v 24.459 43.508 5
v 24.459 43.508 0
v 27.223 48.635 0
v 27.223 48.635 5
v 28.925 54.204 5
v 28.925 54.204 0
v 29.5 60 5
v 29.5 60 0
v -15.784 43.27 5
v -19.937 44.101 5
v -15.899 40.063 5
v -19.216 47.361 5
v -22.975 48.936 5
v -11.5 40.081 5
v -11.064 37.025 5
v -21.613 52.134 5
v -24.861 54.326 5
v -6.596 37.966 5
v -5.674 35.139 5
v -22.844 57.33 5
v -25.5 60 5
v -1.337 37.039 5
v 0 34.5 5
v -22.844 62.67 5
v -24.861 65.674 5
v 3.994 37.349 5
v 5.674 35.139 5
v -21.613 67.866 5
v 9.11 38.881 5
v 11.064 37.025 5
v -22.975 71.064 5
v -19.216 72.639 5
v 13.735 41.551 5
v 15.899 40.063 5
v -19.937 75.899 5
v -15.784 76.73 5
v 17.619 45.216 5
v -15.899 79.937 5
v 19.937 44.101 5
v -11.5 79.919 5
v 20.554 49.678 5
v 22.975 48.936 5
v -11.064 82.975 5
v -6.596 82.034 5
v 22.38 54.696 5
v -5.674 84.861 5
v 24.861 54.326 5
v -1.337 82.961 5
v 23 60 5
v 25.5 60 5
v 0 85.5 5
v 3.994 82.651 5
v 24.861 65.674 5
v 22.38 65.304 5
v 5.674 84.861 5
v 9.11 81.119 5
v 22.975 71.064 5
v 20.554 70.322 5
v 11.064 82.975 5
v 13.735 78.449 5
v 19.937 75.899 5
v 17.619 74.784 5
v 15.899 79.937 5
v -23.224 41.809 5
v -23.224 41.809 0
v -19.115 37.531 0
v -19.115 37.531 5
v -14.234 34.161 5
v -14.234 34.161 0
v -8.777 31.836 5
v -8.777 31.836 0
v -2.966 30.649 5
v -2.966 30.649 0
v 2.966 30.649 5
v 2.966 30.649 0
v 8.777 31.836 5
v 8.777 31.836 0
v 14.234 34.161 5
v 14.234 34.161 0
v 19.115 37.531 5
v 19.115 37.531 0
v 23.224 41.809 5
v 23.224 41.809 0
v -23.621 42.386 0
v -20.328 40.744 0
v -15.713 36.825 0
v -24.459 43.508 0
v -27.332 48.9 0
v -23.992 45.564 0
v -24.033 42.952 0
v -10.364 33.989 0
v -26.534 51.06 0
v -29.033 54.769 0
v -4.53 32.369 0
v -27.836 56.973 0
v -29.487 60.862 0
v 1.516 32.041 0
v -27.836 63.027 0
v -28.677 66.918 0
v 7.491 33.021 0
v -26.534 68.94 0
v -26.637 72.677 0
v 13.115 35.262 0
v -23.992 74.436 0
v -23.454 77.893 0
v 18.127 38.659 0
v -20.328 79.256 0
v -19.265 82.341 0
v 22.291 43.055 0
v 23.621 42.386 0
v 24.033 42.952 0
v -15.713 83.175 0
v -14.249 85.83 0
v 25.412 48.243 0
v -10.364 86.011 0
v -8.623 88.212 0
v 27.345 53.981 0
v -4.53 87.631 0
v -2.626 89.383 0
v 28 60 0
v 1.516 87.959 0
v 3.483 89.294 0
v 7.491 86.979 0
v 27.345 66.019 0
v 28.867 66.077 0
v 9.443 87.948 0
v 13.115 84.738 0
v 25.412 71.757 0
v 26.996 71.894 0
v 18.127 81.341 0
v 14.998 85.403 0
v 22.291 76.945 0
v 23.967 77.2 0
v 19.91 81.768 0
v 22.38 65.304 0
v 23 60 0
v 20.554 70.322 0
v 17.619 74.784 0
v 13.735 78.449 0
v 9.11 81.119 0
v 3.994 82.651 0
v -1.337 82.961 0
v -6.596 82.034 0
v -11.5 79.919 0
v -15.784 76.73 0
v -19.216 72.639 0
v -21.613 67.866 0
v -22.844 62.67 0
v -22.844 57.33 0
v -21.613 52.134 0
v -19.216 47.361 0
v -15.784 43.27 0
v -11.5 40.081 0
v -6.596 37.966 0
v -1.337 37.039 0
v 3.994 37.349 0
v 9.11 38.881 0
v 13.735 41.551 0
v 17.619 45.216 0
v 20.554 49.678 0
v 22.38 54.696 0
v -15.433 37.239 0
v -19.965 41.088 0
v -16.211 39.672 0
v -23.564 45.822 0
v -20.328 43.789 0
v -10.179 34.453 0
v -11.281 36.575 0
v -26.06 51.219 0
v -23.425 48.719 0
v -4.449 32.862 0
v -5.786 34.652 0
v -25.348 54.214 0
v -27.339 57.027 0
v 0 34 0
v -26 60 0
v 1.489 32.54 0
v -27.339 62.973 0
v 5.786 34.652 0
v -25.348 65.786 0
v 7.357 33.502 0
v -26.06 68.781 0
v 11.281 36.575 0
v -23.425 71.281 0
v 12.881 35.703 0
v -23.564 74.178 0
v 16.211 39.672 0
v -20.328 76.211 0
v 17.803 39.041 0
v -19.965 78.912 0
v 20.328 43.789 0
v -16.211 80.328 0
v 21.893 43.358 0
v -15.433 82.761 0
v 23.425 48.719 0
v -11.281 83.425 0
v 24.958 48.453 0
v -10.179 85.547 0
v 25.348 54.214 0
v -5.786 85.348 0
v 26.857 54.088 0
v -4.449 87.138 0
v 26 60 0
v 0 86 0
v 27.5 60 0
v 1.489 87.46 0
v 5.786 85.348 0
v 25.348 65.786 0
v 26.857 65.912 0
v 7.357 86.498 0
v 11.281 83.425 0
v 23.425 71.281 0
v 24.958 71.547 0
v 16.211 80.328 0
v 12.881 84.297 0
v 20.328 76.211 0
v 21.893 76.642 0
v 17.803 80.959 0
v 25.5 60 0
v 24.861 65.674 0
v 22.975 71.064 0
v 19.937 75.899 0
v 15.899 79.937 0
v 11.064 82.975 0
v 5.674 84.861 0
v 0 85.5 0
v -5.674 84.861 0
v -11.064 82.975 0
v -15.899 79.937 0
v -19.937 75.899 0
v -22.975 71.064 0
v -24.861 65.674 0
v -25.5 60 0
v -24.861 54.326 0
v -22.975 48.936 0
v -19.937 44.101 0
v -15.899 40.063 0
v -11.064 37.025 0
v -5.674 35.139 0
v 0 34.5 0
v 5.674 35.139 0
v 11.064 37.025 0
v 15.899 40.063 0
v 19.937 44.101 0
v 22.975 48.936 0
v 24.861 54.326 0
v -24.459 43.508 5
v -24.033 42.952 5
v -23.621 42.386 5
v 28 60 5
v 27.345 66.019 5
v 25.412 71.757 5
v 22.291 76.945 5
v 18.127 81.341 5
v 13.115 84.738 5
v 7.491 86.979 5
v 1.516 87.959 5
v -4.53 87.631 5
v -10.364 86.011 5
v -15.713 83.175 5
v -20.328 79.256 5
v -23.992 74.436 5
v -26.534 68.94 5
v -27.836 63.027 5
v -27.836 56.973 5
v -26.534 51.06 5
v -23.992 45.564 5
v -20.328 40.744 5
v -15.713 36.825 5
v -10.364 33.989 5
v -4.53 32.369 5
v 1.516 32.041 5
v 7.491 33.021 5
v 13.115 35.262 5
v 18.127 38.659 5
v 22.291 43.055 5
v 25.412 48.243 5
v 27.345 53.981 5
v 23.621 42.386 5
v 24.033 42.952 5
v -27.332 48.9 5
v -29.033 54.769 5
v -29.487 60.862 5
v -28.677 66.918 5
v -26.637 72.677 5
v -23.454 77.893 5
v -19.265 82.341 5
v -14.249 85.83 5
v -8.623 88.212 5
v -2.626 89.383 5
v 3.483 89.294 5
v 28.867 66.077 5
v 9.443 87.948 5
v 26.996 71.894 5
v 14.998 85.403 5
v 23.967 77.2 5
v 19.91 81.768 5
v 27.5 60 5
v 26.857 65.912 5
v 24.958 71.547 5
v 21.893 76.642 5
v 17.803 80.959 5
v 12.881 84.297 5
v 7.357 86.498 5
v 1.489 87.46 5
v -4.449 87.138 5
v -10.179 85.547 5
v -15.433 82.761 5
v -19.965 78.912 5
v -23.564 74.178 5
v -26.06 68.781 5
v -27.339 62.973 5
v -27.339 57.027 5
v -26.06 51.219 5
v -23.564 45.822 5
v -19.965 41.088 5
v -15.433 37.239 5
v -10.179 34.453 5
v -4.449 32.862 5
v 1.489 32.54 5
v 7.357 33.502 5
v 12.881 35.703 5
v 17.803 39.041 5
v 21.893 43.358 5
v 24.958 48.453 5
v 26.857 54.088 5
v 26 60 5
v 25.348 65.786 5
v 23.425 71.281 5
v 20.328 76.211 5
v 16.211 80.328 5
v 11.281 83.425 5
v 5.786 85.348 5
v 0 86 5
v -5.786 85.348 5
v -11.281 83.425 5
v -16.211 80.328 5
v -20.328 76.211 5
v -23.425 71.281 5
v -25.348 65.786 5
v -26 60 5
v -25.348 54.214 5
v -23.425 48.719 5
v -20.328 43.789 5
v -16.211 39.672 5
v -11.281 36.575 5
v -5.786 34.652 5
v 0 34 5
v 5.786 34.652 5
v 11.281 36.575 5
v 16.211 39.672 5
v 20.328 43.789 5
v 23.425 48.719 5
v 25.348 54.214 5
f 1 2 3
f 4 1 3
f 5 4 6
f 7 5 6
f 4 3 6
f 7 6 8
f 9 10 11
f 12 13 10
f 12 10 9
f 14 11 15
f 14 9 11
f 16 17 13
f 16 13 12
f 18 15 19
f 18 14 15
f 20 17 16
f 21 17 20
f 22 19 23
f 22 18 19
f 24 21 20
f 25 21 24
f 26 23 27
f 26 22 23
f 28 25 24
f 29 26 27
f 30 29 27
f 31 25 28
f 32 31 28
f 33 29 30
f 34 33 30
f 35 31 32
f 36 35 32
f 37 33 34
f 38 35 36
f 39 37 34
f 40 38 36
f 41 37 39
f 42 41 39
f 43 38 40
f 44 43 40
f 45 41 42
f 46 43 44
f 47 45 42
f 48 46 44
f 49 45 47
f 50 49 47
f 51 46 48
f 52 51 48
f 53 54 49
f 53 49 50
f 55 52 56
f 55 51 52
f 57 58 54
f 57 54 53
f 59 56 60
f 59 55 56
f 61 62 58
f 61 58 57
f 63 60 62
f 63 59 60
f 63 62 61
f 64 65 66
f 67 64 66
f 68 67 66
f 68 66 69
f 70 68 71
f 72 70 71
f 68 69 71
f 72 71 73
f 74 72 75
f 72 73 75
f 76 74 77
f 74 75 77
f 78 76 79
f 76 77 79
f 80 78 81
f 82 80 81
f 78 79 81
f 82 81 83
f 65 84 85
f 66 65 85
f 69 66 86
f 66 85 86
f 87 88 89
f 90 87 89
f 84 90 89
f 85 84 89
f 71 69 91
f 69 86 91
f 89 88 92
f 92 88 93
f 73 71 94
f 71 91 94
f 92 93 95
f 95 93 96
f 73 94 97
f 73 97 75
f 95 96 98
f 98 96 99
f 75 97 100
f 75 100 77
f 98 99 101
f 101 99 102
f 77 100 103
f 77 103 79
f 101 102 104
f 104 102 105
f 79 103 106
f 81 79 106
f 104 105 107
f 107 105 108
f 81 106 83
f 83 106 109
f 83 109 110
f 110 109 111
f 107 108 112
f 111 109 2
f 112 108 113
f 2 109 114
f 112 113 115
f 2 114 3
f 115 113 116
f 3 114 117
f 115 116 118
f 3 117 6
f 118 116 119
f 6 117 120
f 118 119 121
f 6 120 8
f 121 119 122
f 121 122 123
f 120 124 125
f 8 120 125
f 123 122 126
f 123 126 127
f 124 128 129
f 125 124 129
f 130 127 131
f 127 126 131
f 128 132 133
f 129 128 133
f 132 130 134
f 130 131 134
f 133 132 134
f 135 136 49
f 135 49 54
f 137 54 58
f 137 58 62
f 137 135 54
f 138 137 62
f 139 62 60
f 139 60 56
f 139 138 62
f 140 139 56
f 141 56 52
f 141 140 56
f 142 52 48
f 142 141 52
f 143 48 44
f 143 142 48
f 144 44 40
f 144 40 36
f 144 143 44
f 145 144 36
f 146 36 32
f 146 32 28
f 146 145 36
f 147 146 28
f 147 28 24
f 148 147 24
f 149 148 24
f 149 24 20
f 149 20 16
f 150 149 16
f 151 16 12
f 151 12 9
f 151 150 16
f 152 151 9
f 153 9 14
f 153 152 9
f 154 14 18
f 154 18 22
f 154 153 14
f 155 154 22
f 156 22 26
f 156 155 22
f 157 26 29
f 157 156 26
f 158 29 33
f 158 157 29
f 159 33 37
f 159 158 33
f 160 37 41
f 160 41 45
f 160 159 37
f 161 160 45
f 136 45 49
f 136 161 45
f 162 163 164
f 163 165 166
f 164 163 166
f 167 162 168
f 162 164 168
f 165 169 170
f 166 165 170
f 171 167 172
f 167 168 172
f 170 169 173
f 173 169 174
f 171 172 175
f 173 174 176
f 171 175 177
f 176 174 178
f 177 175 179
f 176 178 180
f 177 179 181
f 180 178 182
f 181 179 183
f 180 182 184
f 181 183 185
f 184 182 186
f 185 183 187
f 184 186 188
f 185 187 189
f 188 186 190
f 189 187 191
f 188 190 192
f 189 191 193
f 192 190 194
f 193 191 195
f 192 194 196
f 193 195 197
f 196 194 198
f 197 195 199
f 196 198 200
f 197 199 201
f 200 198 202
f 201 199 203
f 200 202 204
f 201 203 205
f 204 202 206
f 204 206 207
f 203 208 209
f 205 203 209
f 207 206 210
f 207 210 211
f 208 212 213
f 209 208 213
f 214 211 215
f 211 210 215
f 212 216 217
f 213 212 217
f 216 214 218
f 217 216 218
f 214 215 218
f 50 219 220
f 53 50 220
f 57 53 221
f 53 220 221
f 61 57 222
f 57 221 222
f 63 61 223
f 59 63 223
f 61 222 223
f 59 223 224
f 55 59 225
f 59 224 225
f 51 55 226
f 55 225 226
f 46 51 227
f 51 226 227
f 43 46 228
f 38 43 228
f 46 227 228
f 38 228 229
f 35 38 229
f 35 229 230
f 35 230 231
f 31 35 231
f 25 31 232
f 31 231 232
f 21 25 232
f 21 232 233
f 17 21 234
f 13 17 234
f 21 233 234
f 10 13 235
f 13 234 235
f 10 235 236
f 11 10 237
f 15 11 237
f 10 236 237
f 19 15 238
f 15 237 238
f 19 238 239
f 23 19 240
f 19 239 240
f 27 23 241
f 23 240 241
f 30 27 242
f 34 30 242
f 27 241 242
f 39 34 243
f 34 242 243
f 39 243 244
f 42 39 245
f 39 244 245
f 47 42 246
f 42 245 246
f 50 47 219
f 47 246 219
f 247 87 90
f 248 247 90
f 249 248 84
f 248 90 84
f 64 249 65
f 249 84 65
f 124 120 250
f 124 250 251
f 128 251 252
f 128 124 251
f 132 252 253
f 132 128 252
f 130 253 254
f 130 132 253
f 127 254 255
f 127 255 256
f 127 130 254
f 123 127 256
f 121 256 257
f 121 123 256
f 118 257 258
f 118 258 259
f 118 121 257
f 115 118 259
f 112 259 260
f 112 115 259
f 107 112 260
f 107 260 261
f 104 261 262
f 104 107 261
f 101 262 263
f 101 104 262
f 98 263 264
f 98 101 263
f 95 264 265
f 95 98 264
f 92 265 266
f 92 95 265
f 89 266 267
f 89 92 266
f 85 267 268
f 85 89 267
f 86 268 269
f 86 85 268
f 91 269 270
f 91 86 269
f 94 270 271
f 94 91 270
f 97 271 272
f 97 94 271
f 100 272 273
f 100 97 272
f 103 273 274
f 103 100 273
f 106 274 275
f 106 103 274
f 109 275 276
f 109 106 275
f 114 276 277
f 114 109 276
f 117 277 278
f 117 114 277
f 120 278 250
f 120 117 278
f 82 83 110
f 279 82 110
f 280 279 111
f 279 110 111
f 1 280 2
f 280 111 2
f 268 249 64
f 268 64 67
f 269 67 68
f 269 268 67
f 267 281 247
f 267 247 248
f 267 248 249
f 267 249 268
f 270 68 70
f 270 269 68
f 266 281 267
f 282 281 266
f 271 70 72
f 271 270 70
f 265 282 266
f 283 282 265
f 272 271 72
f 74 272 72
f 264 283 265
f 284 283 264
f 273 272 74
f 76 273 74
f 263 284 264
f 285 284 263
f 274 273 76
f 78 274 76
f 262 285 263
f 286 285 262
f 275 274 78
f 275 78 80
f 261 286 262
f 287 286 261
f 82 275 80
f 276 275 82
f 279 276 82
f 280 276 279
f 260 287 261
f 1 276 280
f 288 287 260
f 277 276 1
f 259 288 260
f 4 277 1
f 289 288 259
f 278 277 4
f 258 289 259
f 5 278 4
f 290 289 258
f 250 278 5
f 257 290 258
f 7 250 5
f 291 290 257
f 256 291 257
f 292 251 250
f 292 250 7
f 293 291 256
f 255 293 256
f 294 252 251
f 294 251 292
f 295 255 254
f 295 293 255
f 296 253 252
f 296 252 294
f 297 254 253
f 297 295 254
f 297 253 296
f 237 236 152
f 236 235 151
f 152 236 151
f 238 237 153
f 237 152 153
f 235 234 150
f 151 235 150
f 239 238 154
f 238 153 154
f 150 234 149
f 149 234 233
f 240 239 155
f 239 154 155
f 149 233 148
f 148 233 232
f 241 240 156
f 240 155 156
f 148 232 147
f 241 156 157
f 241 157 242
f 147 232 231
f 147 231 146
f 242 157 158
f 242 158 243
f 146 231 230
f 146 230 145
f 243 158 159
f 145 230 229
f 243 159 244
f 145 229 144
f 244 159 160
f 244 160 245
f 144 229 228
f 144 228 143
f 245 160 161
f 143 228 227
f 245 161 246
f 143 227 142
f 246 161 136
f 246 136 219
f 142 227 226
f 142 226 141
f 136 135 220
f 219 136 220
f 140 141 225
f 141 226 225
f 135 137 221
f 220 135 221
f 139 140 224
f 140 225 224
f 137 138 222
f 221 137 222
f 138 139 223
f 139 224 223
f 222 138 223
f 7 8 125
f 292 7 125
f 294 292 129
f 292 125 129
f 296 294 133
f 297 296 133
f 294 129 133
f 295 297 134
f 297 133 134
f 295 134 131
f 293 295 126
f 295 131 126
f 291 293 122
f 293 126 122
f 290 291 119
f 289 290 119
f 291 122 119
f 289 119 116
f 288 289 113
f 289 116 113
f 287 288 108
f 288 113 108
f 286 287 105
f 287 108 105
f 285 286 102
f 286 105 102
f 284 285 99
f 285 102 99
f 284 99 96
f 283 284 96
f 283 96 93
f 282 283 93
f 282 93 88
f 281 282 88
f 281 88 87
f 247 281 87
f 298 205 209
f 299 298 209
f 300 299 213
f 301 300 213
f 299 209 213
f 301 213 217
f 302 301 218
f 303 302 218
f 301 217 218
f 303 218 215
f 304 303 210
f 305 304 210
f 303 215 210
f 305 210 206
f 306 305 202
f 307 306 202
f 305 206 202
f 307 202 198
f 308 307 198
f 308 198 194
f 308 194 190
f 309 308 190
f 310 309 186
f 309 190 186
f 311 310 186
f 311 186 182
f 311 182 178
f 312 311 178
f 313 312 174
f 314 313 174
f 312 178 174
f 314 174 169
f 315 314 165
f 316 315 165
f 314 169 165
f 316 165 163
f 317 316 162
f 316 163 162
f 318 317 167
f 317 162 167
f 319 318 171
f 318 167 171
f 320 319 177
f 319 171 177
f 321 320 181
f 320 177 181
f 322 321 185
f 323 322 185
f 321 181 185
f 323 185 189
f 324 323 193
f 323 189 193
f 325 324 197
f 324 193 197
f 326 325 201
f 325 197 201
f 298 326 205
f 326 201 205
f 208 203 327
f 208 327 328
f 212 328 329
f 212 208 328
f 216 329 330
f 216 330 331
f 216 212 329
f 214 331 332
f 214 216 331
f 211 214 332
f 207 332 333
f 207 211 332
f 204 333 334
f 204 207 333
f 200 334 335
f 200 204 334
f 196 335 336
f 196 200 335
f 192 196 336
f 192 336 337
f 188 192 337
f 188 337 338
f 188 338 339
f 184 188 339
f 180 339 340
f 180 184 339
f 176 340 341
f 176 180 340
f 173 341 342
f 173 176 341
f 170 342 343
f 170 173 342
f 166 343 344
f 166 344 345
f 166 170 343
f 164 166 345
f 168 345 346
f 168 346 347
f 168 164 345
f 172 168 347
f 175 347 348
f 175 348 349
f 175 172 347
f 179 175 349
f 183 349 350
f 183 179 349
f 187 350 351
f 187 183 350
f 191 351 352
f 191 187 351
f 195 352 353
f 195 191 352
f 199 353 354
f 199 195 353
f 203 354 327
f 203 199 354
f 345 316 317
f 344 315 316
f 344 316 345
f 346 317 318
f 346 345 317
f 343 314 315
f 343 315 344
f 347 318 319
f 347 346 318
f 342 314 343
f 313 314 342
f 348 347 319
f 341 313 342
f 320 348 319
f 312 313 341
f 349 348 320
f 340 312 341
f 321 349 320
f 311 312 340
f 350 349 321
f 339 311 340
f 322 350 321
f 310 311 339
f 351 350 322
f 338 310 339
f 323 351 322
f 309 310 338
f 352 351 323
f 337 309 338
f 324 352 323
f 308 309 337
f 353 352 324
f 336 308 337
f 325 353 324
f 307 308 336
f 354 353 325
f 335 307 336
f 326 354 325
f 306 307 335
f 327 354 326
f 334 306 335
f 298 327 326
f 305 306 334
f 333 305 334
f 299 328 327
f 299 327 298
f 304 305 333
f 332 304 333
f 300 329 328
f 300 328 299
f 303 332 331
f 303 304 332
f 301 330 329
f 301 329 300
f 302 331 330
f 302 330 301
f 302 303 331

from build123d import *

# Parameters (mm, degrees)
F0_R     = 28
F1_DEPTH = 5
F0_R_2   = 25.5
F0_R_3   = 23
F0_R_4   = 27.5
F0_R_5   = 26


# Not quite as in the source:
# - a feature names something its author has since deleted; it is built from what else it names


with BuildPart() as f1:
    # F0 (on Top) → F1 (new body)
    with BuildSketch(Plane.XY):
        with BuildLine():
            ThreePointArc((24.4593593513, 43.5078885487), (28.211709456, 51.377387312), (29.5, 60))
            ThreePointArc((29.5, 60), (-8.622612688, 88.211709456), (-24.4593593513, 43.5078885487))
            ThreePointArc((-24.4593593513, 43.5078885487), (-23.8253683168, 42.6704704408), (-23.2239332129, 41.8093725747))
            ThreePointArc((-23.2239332129, 41.8093725747), (0, 30.5), (23.2239332129, 41.8093725747))
            ThreePointArc((23.2239332129, 41.8093725747), (23.8253683168, 42.6704704408), (24.4593593513, 43.5078885487))
        make_face()
        with Locations((0, 60)):
            Circle(F0_R, mode=Mode.SUBTRACT)
    extrude(amount=F1_DEPTH)


with BuildPart() as f1b:
    # F0 (on Top) → F1, piece 2 (new body)
    with BuildSketch(Plane.XY):
        with Locations((0, 60)):
            Circle(F0_R_2)
        with Locations((0, 60)):
            Circle(F0_R_3, mode=Mode.SUBTRACT)
    extrude(amount=F1_DEPTH)


with BuildPart() as f1c:
    # F0 (on Top) → F1, piece 3 (new body)
    with BuildSketch(Plane.XY):
        with Locations((0, 60)):
            Circle(F0_R_4)
        with Locations((0, 60)):
            Circle(F0_R_5, mode=Mode.SUBTRACT)
    extrude(amount=F1_DEPTH)


solid = Compound([f1.part, f1b.part, f1c.part])
